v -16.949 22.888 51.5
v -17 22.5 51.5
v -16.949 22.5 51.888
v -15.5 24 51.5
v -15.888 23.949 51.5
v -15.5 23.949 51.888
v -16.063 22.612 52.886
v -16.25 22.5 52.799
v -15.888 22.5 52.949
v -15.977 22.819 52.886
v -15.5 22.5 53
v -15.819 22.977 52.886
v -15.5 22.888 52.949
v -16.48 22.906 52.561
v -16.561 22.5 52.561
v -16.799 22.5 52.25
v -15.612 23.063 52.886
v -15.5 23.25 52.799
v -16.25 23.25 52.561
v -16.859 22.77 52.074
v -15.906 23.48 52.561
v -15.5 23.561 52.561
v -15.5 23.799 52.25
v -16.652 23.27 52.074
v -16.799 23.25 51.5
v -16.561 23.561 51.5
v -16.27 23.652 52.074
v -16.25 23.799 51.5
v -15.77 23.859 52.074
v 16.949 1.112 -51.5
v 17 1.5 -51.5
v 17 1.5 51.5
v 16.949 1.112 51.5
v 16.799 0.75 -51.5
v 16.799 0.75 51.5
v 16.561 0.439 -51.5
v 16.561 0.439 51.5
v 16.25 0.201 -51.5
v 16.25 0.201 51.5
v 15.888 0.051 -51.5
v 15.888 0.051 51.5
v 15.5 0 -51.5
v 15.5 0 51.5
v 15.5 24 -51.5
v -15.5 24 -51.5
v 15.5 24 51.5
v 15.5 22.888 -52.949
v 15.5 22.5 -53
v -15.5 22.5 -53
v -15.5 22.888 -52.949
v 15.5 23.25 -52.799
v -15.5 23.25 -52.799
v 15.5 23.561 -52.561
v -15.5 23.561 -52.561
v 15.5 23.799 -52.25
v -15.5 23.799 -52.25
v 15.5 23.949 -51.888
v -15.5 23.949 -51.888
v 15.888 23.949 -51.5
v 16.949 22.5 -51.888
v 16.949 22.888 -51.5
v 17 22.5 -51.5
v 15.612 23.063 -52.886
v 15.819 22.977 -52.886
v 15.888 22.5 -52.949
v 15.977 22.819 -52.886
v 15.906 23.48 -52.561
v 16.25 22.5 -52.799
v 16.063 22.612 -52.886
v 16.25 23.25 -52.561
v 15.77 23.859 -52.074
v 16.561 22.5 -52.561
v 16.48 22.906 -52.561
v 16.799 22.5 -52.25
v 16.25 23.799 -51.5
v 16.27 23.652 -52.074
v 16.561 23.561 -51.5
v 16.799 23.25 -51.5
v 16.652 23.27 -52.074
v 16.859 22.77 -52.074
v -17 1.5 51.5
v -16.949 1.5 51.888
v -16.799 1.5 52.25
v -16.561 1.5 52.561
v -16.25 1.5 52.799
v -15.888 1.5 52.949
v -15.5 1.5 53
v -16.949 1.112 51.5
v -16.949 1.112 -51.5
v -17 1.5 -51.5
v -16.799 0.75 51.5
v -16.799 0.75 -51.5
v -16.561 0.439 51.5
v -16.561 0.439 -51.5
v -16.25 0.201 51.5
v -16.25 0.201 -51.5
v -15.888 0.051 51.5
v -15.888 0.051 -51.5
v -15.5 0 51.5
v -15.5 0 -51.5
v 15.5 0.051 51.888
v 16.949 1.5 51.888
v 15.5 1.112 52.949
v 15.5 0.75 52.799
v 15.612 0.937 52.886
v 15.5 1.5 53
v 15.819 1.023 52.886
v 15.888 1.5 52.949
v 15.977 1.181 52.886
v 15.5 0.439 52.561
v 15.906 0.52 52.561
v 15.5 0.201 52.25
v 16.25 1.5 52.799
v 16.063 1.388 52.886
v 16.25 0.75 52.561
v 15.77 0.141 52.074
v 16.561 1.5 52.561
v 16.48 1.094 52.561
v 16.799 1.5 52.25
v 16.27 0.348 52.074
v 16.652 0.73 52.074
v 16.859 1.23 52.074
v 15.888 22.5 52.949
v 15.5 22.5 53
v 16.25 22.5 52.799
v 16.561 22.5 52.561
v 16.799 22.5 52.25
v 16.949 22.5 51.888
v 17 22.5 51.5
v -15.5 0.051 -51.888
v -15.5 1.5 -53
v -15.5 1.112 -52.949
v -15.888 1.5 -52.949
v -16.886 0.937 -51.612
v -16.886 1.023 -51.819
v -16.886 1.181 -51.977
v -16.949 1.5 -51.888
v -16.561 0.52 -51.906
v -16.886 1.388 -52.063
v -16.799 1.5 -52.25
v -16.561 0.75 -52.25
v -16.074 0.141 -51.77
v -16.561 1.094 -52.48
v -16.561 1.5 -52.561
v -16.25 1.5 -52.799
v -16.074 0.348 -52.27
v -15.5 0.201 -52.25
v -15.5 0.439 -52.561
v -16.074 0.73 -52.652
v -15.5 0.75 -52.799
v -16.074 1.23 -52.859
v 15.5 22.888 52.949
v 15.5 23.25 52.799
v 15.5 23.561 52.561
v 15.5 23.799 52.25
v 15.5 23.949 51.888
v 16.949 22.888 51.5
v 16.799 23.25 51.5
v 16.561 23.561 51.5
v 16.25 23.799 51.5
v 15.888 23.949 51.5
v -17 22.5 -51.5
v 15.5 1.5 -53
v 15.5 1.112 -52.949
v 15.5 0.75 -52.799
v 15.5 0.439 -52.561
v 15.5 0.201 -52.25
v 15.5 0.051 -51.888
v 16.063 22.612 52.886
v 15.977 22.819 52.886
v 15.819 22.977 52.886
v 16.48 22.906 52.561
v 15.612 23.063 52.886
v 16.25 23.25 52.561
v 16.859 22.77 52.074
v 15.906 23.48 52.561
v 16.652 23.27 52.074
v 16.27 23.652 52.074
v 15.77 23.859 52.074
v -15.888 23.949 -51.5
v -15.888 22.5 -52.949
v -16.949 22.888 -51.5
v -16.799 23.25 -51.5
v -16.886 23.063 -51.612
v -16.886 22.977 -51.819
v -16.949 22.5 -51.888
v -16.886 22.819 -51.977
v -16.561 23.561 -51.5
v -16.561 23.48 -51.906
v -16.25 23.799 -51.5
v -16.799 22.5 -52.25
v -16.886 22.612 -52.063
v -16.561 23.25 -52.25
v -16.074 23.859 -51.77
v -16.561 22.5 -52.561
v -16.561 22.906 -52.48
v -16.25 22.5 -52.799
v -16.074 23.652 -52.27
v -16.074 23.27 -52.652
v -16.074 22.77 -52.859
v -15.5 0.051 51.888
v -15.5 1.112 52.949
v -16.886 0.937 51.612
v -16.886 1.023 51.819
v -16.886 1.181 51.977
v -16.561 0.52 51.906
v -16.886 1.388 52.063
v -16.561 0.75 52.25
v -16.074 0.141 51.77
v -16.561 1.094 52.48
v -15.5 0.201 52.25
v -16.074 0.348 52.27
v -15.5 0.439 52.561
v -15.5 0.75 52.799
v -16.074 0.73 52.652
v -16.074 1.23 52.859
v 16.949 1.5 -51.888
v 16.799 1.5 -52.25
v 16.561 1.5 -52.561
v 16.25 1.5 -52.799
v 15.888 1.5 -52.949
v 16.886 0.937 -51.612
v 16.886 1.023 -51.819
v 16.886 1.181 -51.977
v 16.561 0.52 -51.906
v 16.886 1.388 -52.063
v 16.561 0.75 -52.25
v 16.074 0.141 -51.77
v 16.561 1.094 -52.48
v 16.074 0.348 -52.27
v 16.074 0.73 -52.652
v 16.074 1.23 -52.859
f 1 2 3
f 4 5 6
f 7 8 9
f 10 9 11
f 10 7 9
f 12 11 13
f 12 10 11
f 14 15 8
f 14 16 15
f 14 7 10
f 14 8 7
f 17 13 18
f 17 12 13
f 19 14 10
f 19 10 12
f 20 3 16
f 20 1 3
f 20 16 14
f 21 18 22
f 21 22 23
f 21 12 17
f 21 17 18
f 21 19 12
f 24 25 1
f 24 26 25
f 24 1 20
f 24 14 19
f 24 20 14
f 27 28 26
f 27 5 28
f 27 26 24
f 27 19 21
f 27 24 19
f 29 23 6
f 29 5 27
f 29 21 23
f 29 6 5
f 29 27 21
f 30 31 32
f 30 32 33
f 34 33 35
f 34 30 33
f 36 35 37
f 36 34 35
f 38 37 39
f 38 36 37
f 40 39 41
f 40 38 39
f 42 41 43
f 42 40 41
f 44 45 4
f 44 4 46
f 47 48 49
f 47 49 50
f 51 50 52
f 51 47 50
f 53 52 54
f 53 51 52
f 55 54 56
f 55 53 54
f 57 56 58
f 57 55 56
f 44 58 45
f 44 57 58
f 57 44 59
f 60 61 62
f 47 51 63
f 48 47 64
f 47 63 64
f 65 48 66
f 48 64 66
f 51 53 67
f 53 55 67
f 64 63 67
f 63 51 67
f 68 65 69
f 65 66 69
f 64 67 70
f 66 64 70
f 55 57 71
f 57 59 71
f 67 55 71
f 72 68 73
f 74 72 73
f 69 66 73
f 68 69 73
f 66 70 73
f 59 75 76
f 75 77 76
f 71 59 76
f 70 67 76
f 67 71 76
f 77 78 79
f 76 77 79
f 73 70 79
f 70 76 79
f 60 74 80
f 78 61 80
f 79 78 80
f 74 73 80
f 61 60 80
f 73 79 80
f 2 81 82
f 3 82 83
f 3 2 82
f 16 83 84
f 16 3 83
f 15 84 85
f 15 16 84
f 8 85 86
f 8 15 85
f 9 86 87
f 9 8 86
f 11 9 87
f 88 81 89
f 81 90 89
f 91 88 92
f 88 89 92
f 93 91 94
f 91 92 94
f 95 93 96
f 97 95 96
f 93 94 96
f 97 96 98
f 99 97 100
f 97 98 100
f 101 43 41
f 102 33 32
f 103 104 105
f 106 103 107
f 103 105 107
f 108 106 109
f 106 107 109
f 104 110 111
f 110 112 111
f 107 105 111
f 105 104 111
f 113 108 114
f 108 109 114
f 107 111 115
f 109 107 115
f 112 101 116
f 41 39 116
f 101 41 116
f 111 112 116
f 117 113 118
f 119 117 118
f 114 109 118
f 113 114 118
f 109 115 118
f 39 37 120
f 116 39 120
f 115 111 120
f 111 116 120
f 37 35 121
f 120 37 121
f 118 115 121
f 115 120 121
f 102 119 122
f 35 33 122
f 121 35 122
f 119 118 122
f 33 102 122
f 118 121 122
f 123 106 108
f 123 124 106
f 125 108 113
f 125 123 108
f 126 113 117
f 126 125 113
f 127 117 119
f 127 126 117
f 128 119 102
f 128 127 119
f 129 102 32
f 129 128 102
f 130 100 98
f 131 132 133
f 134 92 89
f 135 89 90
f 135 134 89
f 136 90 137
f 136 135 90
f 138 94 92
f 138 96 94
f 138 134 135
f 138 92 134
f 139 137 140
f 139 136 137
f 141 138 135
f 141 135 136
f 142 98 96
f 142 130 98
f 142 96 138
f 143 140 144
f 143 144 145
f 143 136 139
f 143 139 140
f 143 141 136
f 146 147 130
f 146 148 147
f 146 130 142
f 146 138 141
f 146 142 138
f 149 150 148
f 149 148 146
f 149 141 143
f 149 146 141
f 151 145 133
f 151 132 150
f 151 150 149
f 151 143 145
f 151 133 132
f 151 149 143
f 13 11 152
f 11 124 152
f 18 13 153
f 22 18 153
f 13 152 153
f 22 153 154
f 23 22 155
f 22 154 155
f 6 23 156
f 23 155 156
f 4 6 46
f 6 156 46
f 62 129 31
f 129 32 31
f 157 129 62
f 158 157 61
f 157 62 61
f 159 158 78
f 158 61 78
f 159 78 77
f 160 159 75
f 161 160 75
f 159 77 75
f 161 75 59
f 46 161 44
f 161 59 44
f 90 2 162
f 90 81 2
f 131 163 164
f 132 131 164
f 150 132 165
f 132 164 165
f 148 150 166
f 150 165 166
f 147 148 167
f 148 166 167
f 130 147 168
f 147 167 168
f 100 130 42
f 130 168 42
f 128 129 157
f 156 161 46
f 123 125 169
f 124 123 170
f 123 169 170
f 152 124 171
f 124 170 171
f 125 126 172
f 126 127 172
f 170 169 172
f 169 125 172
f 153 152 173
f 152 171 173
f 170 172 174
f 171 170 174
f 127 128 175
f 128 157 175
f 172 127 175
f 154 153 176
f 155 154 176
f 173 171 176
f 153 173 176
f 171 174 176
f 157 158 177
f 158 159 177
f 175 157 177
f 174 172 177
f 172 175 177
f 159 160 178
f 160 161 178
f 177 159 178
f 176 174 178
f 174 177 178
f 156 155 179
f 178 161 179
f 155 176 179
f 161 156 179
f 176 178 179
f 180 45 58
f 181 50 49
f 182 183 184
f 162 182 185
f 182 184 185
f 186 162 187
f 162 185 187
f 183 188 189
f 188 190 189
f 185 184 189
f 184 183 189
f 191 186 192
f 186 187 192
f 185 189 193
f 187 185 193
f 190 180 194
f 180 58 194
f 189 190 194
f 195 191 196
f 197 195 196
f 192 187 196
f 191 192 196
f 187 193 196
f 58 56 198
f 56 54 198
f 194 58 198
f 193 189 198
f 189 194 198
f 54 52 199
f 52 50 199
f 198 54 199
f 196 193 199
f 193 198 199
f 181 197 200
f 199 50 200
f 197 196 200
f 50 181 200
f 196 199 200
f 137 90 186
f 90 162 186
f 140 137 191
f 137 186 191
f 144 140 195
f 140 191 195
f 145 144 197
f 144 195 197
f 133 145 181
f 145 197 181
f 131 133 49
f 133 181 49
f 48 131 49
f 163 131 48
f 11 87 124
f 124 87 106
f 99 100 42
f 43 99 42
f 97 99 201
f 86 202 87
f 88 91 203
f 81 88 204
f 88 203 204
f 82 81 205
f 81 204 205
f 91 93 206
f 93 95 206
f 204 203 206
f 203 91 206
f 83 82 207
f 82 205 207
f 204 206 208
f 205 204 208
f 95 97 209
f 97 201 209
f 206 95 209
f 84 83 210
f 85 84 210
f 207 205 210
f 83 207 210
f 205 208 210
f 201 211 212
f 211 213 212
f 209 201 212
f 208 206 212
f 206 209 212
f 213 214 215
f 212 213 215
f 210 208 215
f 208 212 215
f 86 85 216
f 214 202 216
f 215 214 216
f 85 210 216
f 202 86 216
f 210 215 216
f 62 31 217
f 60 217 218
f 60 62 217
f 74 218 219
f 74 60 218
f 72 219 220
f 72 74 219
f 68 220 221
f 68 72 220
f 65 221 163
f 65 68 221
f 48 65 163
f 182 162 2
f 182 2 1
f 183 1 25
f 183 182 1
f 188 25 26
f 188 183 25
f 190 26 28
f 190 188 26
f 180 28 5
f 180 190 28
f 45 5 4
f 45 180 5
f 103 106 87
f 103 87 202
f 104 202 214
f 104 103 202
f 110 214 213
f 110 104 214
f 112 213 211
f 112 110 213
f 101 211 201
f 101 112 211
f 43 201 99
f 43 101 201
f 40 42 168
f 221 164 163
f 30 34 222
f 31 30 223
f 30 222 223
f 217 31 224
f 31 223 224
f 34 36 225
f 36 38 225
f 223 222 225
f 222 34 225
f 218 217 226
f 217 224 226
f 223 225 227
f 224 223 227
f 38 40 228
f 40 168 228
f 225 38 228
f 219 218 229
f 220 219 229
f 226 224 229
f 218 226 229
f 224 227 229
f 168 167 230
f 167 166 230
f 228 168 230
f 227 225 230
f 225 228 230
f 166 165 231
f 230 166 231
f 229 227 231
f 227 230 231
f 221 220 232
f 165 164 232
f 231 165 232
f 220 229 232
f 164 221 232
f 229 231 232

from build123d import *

# Parameters (mm, degrees)
CROQUIS1_W              = 34
CROQUIS1_H              = 106
SALIENTE_EXTRUIR1_DEPTH = 24
REDONDEO1_R             = 1.5


with BuildPart() as part:
    # Croquis1 → Saliente-Extruir1 (new body)
    with BuildSketch(Plane(origin=(0, 0, 0), x_dir=(1, 0, 0), z_dir=(0, 1, 0))):
        Rectangle(CROQUIS1_W, CROQUIS1_H)
    extrude(amount=SALIENTE_EXTRUIR1_DEPTH)

    # Redondeo1
    redondeo1_edges = [part.edges().sort_by_distance(p)[0] for p in [
        (17, 24, 0),
        (0, 24, -53),
        (-17, 24, 0),
        (0, 0, -53),
        (17, 0, 0),
        (0, 0, 53),
        (-17, 0, 0),
        (-17, 12, -53),
        (17, 12, -53),
        (17, 12, 53),
        (-17, 12, 53),
        (0, 24, 53),
    ]]
    fillet(redondeo1_edges, radius=REDONDEO1_R)


solid = part.part
